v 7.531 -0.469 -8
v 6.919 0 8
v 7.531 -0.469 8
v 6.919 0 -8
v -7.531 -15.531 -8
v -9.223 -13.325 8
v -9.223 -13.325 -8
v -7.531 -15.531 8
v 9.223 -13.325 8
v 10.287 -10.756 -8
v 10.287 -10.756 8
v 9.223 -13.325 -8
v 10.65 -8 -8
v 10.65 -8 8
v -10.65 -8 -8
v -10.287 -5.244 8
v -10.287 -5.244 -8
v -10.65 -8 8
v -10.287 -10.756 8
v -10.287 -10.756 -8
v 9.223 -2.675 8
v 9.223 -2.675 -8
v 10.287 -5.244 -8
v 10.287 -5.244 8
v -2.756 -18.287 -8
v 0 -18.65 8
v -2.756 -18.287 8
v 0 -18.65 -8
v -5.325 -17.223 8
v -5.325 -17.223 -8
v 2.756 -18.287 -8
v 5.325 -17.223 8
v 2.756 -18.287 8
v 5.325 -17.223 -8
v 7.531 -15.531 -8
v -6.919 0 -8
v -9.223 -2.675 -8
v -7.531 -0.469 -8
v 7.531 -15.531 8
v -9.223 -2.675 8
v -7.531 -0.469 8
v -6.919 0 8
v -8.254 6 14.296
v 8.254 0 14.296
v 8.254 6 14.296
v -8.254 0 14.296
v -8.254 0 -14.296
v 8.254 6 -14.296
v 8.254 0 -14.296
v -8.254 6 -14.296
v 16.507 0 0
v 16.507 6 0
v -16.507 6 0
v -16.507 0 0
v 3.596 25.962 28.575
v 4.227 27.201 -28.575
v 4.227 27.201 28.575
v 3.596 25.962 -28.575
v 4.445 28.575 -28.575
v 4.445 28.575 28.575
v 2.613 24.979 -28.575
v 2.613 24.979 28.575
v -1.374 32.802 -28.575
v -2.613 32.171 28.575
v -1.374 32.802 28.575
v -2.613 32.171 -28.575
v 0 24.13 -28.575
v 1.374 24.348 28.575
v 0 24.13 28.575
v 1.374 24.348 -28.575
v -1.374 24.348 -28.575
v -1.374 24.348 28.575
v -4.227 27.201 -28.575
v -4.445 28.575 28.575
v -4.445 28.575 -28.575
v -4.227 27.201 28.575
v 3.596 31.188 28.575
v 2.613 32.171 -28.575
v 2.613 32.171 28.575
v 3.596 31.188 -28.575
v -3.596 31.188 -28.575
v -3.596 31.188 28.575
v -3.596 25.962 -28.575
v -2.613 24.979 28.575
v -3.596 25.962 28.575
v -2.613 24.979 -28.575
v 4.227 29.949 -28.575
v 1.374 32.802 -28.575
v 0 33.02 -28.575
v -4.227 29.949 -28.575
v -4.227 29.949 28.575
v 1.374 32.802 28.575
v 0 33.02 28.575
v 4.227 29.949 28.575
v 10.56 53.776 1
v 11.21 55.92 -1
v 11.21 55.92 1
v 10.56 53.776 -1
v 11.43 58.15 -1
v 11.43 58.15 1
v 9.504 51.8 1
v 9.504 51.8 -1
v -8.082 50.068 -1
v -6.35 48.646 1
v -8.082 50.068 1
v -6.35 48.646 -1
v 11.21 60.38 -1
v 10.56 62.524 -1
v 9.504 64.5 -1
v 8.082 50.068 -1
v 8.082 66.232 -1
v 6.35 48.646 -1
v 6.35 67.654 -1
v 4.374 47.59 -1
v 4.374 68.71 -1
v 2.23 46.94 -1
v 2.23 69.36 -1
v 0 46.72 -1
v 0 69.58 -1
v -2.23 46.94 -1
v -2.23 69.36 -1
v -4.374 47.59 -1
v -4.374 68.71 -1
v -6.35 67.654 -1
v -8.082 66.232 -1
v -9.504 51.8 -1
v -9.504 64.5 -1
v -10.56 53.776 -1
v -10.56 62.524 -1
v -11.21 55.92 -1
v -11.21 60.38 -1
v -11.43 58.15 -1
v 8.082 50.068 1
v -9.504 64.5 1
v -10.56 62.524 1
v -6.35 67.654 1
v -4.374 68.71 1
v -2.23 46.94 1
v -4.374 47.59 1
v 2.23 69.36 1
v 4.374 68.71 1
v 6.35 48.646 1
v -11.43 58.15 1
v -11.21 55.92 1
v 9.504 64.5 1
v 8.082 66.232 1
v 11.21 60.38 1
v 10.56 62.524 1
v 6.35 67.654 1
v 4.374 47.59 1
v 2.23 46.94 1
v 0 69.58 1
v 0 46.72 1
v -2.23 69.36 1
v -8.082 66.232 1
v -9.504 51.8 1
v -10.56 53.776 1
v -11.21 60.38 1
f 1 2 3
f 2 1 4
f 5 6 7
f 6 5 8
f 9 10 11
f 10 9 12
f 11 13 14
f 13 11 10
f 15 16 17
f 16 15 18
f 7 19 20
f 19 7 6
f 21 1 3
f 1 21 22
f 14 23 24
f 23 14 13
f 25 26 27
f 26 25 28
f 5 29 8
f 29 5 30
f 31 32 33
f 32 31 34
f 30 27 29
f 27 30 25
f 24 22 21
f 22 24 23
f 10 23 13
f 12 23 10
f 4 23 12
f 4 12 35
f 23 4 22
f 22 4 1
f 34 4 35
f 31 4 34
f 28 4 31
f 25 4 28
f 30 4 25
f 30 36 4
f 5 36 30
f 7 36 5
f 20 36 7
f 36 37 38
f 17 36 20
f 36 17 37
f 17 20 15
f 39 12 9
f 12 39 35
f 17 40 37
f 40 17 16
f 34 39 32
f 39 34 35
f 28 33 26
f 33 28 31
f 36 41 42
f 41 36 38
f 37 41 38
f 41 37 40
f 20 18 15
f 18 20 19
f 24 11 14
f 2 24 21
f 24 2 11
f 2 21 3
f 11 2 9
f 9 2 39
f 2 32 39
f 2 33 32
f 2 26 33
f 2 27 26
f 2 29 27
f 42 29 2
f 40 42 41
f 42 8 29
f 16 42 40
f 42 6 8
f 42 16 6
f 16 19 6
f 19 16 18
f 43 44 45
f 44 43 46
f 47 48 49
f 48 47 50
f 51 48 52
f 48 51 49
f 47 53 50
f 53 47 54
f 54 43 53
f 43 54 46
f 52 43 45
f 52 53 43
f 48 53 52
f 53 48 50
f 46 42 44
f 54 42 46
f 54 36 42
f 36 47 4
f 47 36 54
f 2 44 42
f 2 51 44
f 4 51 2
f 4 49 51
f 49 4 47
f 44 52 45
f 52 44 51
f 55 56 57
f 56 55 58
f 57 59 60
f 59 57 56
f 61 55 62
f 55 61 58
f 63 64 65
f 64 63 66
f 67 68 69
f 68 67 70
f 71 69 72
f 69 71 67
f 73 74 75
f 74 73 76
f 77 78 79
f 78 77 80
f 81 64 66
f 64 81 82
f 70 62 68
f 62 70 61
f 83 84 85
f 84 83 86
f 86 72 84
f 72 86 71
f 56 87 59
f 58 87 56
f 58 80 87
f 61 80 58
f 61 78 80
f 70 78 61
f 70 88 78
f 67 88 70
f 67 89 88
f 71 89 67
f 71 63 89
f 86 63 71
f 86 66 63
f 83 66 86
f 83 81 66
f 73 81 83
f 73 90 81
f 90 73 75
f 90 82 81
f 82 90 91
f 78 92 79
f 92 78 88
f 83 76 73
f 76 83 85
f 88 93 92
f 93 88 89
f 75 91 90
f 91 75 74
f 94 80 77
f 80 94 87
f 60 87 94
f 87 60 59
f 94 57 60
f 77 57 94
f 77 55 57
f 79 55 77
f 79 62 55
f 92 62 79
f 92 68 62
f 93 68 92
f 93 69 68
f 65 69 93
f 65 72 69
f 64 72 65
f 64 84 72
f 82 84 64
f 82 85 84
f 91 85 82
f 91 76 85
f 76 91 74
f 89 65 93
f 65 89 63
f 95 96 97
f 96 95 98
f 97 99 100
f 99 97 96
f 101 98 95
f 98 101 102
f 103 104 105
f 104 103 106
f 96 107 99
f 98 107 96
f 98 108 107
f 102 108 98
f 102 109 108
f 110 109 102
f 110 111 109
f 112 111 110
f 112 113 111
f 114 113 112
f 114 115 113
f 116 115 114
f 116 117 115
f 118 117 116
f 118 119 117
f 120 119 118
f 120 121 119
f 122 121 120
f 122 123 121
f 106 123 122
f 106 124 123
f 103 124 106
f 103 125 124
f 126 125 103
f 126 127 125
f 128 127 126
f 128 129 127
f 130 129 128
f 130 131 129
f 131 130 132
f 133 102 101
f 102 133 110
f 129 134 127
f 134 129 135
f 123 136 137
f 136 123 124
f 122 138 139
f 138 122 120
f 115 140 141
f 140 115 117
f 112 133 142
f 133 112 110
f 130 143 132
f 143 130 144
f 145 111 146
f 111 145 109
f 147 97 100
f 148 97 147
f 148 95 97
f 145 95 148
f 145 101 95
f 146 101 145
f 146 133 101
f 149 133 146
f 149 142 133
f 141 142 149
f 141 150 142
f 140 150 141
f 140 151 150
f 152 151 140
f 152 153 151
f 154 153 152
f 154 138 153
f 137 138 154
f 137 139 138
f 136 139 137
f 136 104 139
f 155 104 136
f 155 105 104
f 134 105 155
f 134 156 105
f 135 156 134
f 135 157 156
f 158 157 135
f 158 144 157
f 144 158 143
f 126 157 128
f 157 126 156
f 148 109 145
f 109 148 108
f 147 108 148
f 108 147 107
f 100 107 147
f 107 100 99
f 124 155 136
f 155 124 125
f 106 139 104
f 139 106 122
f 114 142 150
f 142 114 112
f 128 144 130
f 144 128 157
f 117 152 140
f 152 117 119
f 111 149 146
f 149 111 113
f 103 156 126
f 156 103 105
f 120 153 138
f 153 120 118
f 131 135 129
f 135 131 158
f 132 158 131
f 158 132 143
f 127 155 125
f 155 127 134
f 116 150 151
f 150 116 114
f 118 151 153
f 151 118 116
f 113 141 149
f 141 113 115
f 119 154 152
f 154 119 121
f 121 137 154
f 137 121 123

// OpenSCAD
// Auto-generated by scripts/author_from_manifest.py (Phase D.3).
// Source: data/phase_d_manifest.json (sku_intent='tyco-ty3151-upright-200f').
// Do not hand-edit — regenerate from the manifest.
//
// @part tyco_ty3151_upright_200f
// @kind sprinkler_head
// @category head.upright.k56
// @display-name "Tyco TY3151 Upright K5.6 SR 200°F"
// @mfg tyco_fire_protection
// @mfg-pn TY3151
// @listing UL FM
// @hazard-classes LH OH1
// @price-usd 13.80
// @install-minutes 8
// @crew journeyman
// @k-factor 5.6
// @orientation upright
// @response standard
// @temperature 200F
// @param size_in number default=0.5 label="Size" unit="in"
// @port inlet position=[0,0.014,0] direction=[0,1,0] style=NPT_threaded size_in=0.5 role=drop

size_in = 0.5;
k_factor = 5.6;

length_mm   = 57.15;
body_dia_mm = 25.40;
thread_od   = 21.3;
thread_len  = 16;
deflector_d = body_dia_mm * 0.9;

rotate([180,0,0]) union() {
    translate([0, thread_len/2, 0])
        cylinder(h = thread_len, d = thread_od, center = true, $fn = 24);
    translate([0, -3, 0])
        rotate([90, 0, 0])
        cylinder(h = 6, d = thread_od * 1.55, $fn = 6, center = true);
    translate([0, -length_mm/2, 0])
        cylinder(h = length_mm, d = body_dia_mm * 0.35, center = true, $fn = 20);
    translate([0, -length_mm - 1, 0])
        cylinder(h = 2, d = deflector_d, center = true, $fn = 32);
}
